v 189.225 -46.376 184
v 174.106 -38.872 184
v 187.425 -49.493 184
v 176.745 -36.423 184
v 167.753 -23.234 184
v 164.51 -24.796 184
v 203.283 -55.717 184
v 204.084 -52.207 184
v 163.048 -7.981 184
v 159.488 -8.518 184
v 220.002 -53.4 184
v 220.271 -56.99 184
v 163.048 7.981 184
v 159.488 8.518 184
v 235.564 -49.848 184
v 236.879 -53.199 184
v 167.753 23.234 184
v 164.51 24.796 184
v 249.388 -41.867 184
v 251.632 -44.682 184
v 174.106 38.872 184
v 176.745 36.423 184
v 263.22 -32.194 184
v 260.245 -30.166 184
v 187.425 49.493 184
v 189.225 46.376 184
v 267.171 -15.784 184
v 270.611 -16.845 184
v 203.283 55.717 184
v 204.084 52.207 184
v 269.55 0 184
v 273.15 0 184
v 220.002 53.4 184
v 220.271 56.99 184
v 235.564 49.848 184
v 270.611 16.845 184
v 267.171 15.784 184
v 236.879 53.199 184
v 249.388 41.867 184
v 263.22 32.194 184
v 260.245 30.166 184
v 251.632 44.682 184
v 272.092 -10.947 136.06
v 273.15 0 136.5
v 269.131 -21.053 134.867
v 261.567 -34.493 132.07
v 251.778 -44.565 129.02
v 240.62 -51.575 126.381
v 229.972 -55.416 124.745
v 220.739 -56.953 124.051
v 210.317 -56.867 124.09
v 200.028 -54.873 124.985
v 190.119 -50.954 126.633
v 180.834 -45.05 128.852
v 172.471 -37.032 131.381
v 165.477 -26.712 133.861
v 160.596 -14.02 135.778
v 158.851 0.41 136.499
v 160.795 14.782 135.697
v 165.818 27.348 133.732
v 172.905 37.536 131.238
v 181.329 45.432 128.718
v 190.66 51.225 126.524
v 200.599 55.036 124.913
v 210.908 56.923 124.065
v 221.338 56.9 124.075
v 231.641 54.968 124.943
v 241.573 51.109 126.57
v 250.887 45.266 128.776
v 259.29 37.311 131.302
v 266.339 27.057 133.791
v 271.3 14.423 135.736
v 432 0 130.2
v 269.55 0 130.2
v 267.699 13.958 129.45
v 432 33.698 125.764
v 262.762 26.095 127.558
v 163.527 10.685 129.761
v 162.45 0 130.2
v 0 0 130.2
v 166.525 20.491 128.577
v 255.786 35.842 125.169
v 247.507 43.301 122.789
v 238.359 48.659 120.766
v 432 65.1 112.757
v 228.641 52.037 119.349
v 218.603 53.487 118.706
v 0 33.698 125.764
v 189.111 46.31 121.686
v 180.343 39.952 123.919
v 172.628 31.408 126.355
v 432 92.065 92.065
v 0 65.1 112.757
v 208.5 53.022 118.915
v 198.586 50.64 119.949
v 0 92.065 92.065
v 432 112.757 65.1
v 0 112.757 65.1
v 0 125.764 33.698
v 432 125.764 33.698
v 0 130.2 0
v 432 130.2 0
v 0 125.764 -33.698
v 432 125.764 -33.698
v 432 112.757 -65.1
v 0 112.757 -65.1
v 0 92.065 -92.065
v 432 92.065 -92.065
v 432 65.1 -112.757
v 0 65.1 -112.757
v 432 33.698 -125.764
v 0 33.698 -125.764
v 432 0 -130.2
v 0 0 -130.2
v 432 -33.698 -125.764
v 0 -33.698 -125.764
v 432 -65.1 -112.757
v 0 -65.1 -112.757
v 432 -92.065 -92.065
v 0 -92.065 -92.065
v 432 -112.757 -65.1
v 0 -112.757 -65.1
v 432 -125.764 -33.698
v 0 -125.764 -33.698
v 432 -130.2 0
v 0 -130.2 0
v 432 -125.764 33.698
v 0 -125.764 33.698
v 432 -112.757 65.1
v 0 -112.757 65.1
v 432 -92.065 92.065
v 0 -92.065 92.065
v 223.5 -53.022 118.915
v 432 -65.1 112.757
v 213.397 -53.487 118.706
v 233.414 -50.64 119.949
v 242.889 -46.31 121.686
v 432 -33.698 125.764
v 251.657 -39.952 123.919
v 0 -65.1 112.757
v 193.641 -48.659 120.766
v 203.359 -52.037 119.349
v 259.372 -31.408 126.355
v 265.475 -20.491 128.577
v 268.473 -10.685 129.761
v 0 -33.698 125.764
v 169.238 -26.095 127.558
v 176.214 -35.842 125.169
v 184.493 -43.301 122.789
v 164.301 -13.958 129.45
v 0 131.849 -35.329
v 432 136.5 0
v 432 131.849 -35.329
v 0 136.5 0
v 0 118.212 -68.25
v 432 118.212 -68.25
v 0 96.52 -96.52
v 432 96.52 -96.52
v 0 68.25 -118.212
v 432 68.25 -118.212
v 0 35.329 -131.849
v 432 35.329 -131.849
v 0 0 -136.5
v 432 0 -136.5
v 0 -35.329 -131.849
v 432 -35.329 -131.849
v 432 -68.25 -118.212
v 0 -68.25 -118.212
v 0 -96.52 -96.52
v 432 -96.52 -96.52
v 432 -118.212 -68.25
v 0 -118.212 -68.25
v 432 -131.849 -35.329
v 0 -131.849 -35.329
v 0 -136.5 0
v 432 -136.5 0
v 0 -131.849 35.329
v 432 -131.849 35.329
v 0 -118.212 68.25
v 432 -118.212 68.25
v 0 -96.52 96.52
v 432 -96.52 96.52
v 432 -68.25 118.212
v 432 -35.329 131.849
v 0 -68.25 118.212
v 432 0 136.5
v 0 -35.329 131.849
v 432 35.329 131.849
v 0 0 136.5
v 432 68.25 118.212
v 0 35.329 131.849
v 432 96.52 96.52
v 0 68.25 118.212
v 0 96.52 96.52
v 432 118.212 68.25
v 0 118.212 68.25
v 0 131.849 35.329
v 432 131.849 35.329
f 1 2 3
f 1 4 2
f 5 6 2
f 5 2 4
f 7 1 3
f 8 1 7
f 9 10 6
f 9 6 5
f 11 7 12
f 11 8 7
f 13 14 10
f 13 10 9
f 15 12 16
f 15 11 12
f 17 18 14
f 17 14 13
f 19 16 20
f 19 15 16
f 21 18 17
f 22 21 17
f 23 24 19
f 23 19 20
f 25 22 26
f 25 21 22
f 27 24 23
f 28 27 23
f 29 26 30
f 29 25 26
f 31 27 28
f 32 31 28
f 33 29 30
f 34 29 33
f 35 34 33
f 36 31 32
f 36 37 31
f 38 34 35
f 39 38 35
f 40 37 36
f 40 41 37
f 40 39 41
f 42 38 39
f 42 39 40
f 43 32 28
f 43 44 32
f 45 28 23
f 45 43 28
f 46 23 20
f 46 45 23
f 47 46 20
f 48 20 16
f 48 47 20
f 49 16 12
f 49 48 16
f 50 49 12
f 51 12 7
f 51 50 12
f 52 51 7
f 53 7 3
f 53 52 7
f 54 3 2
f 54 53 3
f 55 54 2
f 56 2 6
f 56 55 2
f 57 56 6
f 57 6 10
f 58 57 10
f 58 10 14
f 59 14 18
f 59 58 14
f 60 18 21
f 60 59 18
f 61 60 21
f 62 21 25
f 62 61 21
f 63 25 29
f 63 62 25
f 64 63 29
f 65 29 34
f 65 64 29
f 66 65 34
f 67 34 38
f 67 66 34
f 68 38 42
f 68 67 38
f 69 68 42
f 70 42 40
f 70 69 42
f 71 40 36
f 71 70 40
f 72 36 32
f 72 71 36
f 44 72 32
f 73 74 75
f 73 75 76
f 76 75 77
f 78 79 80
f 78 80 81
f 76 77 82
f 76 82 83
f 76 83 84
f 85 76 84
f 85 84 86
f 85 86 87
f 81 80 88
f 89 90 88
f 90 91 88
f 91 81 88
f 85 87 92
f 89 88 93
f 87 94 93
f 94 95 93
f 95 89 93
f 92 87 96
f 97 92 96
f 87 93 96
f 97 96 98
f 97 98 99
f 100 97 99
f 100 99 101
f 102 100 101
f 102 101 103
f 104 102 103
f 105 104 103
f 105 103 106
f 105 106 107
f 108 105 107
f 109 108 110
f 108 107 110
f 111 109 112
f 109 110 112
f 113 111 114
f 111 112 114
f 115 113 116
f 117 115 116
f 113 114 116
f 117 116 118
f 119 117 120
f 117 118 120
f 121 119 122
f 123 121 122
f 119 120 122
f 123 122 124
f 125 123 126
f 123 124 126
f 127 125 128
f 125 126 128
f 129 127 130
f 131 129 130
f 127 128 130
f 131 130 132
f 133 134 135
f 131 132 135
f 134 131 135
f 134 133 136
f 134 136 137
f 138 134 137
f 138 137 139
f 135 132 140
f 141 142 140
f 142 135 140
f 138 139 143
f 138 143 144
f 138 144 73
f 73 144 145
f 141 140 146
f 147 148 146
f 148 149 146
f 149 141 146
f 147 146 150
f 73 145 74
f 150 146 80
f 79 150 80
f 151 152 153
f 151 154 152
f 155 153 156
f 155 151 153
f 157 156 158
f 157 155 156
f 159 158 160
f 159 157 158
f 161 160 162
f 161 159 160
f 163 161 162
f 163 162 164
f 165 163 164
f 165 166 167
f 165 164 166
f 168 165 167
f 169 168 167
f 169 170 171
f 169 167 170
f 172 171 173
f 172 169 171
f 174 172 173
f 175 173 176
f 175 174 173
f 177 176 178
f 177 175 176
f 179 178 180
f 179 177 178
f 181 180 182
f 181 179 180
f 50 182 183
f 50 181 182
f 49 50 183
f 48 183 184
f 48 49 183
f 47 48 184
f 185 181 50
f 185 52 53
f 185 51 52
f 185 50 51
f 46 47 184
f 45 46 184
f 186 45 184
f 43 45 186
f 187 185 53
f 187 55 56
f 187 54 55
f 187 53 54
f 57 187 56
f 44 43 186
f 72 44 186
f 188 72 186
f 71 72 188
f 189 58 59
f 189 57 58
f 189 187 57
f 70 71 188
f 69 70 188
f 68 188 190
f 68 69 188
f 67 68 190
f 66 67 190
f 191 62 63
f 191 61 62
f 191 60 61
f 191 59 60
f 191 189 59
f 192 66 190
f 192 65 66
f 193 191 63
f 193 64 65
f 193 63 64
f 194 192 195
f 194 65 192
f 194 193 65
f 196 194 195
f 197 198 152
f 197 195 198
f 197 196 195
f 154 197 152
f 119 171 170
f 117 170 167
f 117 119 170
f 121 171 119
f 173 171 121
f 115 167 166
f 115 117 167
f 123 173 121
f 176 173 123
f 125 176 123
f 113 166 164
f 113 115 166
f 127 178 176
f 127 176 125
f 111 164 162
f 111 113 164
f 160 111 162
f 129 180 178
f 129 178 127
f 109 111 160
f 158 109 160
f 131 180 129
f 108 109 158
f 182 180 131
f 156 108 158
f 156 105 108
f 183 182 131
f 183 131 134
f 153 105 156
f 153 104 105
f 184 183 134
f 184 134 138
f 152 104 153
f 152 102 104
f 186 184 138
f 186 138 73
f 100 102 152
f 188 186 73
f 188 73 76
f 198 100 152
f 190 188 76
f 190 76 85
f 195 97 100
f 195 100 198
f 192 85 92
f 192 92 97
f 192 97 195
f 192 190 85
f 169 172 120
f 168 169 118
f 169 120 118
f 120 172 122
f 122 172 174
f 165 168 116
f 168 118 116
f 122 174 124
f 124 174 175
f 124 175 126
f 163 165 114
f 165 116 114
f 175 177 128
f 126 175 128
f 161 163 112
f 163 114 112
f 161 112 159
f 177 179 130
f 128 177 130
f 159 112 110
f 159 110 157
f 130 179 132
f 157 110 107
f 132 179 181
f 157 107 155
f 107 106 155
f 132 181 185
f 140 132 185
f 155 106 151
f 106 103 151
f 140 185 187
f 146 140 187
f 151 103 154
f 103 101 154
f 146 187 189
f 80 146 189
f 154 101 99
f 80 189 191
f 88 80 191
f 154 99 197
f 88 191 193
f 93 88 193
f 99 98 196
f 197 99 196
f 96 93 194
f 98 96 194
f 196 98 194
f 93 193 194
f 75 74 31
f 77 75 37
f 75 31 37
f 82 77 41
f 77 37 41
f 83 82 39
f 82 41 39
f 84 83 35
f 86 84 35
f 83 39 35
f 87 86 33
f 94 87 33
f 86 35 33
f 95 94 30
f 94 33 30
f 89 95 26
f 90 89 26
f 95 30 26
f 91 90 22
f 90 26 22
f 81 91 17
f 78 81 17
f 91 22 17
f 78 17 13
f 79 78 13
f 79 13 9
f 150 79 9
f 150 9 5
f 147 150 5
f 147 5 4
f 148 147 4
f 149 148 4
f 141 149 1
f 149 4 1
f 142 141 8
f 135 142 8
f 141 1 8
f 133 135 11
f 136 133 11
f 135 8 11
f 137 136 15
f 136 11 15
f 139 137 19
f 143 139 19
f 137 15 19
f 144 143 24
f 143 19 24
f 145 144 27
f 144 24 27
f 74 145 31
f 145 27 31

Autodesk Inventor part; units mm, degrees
ref_plane "YZ Plane" through (0, 0, 0) normal (1, 0, 0) x (0, 1, 0)
ref_plane "XZ Plane" through (0, 0, 0) normal (0, 1, 0) x (-1, 0, 0)
ref_plane "XY Plane" through (0, 0, 0) normal (0, 0, 1) x (1, 0, 0)
sketch "Sketch1" plane through (0, 0, 0) normal (1, 0, 0) x (0, 1, 0)
  circle A0 centre (0, 0) radius 136.5
  dimension "d0" = 273
extrude "Extrude1" add sketch "Sketch1" along normal blind 432
sketch "Sketch2" plane through (0, 0, 0) normal (0, 0, 1) x (1, 0, 0)
  line L0 (0, 136.5) -> (0, -136.5) projected
  line L1 (432, 136.5) -> (432, -136.5) projected
  line L2 (0, 0) -> (432, 0) construction
  circle A0 centre (216, 0) radius 57.15
  dimension "d3" = 114.3
extrude "Extrude2" add sketch "Sketch2" along normal blind 184
sketch "Sketch3" plane through (0, 0, 0) normal (-1, 0, 0) x (0, 0, 1)
  circle A0 centre (0, 0) radius 136.5 projected
  circle A1 centre (0, 0) radius 130.2
  dimension "a" = 216
  dimension "d6" = 260.4
extrude "Extrude3" cut sketch "Sketch3" against normal through all contours A1
sketch "Sketch4" plane through (216, 0, 184) normal (0, 0, 1) x (1, 0, 0)
  circle A0 centre (0, 0) radius 57.15 projected
  circle A1 centre (0, 0) radius 53.55
  dimension "d9" = 107.1
extrude "Extrude4" cut sketch "Sketch4" against normal up to next contours A1
equation "\"d0\" = D1"
equation "\"d1\" = 2 * a"
equation "\"d3\" = D2"
equation "\"d4\" = b"
equation "\"a\" = 216"
equation "\"d6\" = D1 - 2 * s1"
equation "\"d7\" = a"
equation "\"d9\" = D2 - 2 * s2"
equation "\"d10\" = a"
equation "\"D1\" = 273"
equation "\"s1\" = 6.3"
equation "\"D2\" = 114.3"
equation "\"s2\" = 3.6"
equation "\"b\" = 184"
equation "\"Size_Designation\" = 1.2345"
properties part number "DIN 2615-1 Переходный тройник 273 x 6.3 - 114.3 x 3.6 S" material "Сталь"
